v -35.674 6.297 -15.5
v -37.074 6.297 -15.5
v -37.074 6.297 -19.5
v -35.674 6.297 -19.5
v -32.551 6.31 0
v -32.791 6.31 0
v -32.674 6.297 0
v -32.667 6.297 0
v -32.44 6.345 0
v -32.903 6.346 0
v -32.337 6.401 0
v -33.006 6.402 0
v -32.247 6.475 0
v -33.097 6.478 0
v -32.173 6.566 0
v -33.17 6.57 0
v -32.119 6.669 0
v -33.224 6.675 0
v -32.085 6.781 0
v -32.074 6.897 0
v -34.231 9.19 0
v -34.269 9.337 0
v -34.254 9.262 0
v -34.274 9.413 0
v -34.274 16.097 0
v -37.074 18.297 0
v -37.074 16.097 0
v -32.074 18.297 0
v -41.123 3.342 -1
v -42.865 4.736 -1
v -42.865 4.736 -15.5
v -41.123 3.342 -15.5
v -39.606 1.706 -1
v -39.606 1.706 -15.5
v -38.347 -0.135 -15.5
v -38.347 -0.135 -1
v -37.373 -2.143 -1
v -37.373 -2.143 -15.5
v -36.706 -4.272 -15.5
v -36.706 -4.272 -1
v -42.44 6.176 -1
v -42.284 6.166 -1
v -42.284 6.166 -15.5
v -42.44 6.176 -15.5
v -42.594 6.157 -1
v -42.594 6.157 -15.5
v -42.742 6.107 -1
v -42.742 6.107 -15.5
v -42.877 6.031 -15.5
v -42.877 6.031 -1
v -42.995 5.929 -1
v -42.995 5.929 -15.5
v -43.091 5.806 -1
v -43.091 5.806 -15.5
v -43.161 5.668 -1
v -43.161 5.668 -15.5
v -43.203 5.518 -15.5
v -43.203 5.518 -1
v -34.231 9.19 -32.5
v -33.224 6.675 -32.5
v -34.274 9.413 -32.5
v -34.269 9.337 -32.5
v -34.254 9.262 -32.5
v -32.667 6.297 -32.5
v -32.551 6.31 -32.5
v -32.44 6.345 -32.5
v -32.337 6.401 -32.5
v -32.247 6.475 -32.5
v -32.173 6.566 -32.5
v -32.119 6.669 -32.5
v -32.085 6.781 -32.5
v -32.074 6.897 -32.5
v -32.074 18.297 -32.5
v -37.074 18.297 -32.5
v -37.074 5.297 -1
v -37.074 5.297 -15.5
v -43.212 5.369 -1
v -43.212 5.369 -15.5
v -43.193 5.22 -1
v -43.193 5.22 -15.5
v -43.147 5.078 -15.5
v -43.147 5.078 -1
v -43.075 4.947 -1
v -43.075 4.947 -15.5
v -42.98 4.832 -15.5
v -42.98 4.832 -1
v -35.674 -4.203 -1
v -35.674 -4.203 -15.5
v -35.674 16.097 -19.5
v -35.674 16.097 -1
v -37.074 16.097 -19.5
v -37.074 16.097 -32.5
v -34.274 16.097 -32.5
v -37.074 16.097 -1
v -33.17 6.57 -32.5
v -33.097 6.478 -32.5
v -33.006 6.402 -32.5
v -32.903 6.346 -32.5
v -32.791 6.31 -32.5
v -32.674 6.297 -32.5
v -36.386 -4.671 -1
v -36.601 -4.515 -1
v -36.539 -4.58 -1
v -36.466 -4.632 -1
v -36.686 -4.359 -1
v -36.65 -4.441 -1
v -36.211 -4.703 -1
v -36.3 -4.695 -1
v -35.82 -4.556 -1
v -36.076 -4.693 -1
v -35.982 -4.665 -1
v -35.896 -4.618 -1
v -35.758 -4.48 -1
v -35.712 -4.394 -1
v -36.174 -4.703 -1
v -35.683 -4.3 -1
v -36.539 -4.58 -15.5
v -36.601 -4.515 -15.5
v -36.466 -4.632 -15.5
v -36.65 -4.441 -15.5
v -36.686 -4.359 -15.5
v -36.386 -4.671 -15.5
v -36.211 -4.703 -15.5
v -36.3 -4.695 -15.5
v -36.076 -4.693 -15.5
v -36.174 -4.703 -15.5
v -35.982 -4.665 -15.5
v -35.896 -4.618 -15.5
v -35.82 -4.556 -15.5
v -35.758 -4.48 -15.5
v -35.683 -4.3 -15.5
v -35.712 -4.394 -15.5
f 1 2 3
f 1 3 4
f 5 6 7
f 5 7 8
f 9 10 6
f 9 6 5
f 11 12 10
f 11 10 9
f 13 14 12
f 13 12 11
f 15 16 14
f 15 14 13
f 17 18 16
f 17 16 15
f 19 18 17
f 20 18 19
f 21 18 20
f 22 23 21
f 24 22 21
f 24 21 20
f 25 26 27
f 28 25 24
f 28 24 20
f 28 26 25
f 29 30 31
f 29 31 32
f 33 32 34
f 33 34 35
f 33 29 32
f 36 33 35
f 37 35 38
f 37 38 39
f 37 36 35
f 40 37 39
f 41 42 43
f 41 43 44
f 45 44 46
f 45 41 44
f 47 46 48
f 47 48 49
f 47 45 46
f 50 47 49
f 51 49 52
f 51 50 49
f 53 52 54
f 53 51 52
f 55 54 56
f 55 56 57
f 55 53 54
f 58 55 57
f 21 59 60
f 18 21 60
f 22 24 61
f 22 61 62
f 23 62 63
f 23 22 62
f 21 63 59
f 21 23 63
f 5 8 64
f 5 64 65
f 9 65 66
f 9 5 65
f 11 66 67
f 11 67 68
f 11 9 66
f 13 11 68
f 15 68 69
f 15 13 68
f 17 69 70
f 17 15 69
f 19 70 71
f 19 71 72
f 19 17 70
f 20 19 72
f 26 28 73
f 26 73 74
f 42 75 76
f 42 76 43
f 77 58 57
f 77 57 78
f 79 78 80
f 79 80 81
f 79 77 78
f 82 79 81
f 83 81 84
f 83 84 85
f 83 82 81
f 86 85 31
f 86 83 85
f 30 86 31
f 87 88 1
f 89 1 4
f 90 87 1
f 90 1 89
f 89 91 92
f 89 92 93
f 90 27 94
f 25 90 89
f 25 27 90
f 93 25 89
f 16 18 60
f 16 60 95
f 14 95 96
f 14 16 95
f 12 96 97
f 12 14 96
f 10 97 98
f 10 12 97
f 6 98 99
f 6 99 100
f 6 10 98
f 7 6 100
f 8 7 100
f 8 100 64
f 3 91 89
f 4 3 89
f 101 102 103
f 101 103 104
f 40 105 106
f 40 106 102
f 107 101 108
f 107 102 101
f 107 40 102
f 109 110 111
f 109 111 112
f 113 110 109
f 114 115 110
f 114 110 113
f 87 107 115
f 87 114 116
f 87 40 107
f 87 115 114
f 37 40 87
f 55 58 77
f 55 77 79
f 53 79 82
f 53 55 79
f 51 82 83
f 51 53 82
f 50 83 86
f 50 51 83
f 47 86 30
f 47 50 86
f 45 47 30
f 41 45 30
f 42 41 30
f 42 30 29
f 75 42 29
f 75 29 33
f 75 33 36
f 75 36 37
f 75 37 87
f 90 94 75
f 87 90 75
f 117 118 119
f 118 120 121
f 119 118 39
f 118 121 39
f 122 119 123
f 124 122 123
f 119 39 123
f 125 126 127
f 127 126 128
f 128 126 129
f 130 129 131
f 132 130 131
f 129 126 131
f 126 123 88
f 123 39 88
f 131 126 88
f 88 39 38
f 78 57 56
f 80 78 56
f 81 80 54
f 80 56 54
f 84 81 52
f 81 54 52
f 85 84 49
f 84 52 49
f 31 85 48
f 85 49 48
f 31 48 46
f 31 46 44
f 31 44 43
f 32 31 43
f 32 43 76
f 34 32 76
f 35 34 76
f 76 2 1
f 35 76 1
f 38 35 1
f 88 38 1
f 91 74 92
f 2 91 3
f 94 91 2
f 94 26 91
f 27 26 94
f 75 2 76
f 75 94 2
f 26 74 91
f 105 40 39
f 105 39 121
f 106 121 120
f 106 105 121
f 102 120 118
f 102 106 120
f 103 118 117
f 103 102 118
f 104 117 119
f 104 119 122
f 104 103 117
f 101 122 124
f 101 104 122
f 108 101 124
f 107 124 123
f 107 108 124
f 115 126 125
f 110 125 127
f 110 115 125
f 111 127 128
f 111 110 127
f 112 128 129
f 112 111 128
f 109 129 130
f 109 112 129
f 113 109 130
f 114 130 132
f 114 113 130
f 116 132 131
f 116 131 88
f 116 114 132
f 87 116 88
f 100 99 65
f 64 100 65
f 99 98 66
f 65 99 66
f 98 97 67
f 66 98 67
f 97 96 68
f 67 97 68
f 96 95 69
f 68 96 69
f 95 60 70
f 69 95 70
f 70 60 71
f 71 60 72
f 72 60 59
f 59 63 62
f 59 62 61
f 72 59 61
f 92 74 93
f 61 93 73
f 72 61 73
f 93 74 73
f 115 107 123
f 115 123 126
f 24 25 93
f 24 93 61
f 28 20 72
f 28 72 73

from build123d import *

# Parameters (mm, degrees)
F0_W     = 1.4
F0_H     = 9.8
F1_DEPTH = 15.5
F2_DEPTH = 19.5
F3_DEPTH = 1
F4_DEPTH = 32.5


# Not quite as in the source:
# - ends of sketch curves that miss each other by under 0.0002 mm in the source are joined


with BuildPart() as f1:
    # F0 (on Top) → F1 (new body)
    with BuildSketch(Plane.XY):
        with BuildLine():
            Line((-32.0736061335, 18.2974073312), (-37.0736061335, 18.2974073312))
            Line((-37.0736061335, 18.2974073312), (-37.0736061335, 16.0974073312))
            Line((-37.0736061335, 16.0974073312), (-35.6736061335, 16.0974073312))
            Line((-35.6736061335, 16.0974073312), (-34.2736061335, 16.0974073312))
            Line((-34.2736061335, 16.0974073312), (-34.2736061335, 9.4129567733))
            ThreePointArc((-34.2736061335, 9.4129567733), (-34.2627799655, 9.2994922606), (-34.230692148, 9.1901223675))
            Line((-34.230692148, 9.1901223675), (-33.2244723711, 6.6745729254))
            ThreePointArc((-33.2244723711, 6.6745729254), (-33.0063342171, 6.402317089), (-32.6736057993, 6.2974395666))
            Line((-32.6736057993, 6.2974395666), (-32.6673863566, 6.2974073312))
            ThreePointArc((-32.6673863566, 6.2974073312), (-32.2471488287, 6.4753478956), (-32.0736061335, 6.8974073312))
            Line((-32.0736061335, 6.8974073312), (-32.0736061335, 18.2974073312))
        make_face()
        with Locations((-36.3736061335, 11.1974073312)):
            Rectangle(F0_W, F0_H)
        with BuildLine():
            Line((-35.6736061335, 6.2974073312), (-37.0736061335, 6.2974073312))
            Line((-37.0736061335, 6.2974073312), (-37.0736061335, 5.2974073312))
            Line((-37.0736061335, 5.2974073312), (-42.2844909944, 6.1658881413))
            ThreePointArc((-42.2844909944, 6.1658881413), (-42.8770439673, 6.0305679631), (-43.2034719774, 5.5178542706))
            ThreePointArc((-43.2034719774, 5.5178542706), (-43.1469979089, 5.0781395288), (-42.8650641349, 4.7360113048))
            ThreePointArc((-42.8650641349, 4.7360113048), (-38.9420533833, 0.8088724995), (-36.7058590055, -4.271665588))
            ThreePointArc((-36.7058590055, -4.271665588), (-36.5388782387, -4.5797772785), (-36.2106530565, -4.7025926688))
            Line((-36.2106530565, -4.7025926688), (-36.1736061335, -4.7025926688))
            ThreePointArc((-36.1736061335, -4.7025926688), (-35.8200527429, -4.5561460594), (-35.6736061335, -4.2025926688))
            Line((-35.6736061335, -4.2025926688), (-35.6736061335, 6.2974073312))
        make_face()
    extrude(amount=-F1_DEPTH)

    # F0 (on Top) → F2 (join)
    with BuildSketch(Plane.XY):
        with Locations((-36.3736061335, 11.1974073312)):
            Rectangle(F0_W, F0_H)
    extrude(amount=-F2_DEPTH)

    # F0 (on Top) → F3 (cut)
    with BuildSketch(Plane.XY):
        with Locations((-36.3736061335, 11.1974073312)):
            Rectangle(F0_W, F0_H)
        with BuildLine():
            Line((-35.6736061335, 6.2974073312), (-37.0736061335, 6.2974073312))
            Line((-37.0736061335, 6.2974073312), (-37.0736061335, 5.2974073312))
            Line((-37.0736061335, 5.2974073312), (-42.2844909944, 6.1658881413))
            ThreePointArc((-42.2844909944, 6.1658881413), (-42.8770439673, 6.0305679631), (-43.2034719774, 5.5178542706))
            ThreePointArc((-43.2034719774, 5.5178542706), (-43.1469979089, 5.0781395288), (-42.8650641349, 4.7360113048))
            ThreePointArc((-42.8650641349, 4.7360113048), (-38.9420533833, 0.8088724995), (-36.7058590055, -4.271665588))
            ThreePointArc((-36.7058590055, -4.271665588), (-36.5388782387, -4.5797772785), (-36.2106530565, -4.7025926688))
            Line((-36.2106530565, -4.7025926688), (-36.1736061335, -4.7025926688))
            ThreePointArc((-36.1736061335, -4.7025926688), (-35.8200527429, -4.5561460594), (-35.6736061335, -4.2025926688))
            Line((-35.6736061335, -4.2025926688), (-35.6736061335, 6.2974073312))
        make_face()
    extrude(amount=-F3_DEPTH, mode=Mode.SUBTRACT)

    # F0 (on Top) → F4 (join)
    with BuildSketch(Plane.XY):
        with BuildLine():
            Line((-32.0736061335, 18.2974073312), (-37.0736061335, 18.2974073312))
            Line((-37.0736061335, 18.2974073312), (-37.0736061335, 16.0974073312))
            Line((-37.0736061335, 16.0974073312), (-35.6736061335, 16.0974073312))
            Line((-35.6736061335, 16.0974073312), (-34.2736061335, 16.0974073312))
            Line((-34.2736061335, 16.0974073312), (-34.2736061335, 9.4129567733))
            ThreePointArc((-34.2736061335, 9.4129567733), (-34.2627799655, 9.2994922606), (-34.230692148, 9.1901223675))
            Line((-34.230692148, 9.1901223675), (-33.2244723711, 6.6745729254))
            ThreePointArc((-33.2244723711, 6.6745729254), (-33.0063342171, 6.402317089), (-32.6736057993, 6.2974395666))
            Line((-32.6736057993, 6.2974395666), (-32.6673863566, 6.2974073312))
            ThreePointArc((-32.6673863566, 6.2974073312), (-32.2471488287, 6.4753478956), (-32.0736061335, 6.8974073312))
            Line((-32.0736061335, 6.8974073312), (-32.0736061335, 18.2974073312))
        make_face()
    extrude(amount=-F4_DEPTH)


solid = f1.part
